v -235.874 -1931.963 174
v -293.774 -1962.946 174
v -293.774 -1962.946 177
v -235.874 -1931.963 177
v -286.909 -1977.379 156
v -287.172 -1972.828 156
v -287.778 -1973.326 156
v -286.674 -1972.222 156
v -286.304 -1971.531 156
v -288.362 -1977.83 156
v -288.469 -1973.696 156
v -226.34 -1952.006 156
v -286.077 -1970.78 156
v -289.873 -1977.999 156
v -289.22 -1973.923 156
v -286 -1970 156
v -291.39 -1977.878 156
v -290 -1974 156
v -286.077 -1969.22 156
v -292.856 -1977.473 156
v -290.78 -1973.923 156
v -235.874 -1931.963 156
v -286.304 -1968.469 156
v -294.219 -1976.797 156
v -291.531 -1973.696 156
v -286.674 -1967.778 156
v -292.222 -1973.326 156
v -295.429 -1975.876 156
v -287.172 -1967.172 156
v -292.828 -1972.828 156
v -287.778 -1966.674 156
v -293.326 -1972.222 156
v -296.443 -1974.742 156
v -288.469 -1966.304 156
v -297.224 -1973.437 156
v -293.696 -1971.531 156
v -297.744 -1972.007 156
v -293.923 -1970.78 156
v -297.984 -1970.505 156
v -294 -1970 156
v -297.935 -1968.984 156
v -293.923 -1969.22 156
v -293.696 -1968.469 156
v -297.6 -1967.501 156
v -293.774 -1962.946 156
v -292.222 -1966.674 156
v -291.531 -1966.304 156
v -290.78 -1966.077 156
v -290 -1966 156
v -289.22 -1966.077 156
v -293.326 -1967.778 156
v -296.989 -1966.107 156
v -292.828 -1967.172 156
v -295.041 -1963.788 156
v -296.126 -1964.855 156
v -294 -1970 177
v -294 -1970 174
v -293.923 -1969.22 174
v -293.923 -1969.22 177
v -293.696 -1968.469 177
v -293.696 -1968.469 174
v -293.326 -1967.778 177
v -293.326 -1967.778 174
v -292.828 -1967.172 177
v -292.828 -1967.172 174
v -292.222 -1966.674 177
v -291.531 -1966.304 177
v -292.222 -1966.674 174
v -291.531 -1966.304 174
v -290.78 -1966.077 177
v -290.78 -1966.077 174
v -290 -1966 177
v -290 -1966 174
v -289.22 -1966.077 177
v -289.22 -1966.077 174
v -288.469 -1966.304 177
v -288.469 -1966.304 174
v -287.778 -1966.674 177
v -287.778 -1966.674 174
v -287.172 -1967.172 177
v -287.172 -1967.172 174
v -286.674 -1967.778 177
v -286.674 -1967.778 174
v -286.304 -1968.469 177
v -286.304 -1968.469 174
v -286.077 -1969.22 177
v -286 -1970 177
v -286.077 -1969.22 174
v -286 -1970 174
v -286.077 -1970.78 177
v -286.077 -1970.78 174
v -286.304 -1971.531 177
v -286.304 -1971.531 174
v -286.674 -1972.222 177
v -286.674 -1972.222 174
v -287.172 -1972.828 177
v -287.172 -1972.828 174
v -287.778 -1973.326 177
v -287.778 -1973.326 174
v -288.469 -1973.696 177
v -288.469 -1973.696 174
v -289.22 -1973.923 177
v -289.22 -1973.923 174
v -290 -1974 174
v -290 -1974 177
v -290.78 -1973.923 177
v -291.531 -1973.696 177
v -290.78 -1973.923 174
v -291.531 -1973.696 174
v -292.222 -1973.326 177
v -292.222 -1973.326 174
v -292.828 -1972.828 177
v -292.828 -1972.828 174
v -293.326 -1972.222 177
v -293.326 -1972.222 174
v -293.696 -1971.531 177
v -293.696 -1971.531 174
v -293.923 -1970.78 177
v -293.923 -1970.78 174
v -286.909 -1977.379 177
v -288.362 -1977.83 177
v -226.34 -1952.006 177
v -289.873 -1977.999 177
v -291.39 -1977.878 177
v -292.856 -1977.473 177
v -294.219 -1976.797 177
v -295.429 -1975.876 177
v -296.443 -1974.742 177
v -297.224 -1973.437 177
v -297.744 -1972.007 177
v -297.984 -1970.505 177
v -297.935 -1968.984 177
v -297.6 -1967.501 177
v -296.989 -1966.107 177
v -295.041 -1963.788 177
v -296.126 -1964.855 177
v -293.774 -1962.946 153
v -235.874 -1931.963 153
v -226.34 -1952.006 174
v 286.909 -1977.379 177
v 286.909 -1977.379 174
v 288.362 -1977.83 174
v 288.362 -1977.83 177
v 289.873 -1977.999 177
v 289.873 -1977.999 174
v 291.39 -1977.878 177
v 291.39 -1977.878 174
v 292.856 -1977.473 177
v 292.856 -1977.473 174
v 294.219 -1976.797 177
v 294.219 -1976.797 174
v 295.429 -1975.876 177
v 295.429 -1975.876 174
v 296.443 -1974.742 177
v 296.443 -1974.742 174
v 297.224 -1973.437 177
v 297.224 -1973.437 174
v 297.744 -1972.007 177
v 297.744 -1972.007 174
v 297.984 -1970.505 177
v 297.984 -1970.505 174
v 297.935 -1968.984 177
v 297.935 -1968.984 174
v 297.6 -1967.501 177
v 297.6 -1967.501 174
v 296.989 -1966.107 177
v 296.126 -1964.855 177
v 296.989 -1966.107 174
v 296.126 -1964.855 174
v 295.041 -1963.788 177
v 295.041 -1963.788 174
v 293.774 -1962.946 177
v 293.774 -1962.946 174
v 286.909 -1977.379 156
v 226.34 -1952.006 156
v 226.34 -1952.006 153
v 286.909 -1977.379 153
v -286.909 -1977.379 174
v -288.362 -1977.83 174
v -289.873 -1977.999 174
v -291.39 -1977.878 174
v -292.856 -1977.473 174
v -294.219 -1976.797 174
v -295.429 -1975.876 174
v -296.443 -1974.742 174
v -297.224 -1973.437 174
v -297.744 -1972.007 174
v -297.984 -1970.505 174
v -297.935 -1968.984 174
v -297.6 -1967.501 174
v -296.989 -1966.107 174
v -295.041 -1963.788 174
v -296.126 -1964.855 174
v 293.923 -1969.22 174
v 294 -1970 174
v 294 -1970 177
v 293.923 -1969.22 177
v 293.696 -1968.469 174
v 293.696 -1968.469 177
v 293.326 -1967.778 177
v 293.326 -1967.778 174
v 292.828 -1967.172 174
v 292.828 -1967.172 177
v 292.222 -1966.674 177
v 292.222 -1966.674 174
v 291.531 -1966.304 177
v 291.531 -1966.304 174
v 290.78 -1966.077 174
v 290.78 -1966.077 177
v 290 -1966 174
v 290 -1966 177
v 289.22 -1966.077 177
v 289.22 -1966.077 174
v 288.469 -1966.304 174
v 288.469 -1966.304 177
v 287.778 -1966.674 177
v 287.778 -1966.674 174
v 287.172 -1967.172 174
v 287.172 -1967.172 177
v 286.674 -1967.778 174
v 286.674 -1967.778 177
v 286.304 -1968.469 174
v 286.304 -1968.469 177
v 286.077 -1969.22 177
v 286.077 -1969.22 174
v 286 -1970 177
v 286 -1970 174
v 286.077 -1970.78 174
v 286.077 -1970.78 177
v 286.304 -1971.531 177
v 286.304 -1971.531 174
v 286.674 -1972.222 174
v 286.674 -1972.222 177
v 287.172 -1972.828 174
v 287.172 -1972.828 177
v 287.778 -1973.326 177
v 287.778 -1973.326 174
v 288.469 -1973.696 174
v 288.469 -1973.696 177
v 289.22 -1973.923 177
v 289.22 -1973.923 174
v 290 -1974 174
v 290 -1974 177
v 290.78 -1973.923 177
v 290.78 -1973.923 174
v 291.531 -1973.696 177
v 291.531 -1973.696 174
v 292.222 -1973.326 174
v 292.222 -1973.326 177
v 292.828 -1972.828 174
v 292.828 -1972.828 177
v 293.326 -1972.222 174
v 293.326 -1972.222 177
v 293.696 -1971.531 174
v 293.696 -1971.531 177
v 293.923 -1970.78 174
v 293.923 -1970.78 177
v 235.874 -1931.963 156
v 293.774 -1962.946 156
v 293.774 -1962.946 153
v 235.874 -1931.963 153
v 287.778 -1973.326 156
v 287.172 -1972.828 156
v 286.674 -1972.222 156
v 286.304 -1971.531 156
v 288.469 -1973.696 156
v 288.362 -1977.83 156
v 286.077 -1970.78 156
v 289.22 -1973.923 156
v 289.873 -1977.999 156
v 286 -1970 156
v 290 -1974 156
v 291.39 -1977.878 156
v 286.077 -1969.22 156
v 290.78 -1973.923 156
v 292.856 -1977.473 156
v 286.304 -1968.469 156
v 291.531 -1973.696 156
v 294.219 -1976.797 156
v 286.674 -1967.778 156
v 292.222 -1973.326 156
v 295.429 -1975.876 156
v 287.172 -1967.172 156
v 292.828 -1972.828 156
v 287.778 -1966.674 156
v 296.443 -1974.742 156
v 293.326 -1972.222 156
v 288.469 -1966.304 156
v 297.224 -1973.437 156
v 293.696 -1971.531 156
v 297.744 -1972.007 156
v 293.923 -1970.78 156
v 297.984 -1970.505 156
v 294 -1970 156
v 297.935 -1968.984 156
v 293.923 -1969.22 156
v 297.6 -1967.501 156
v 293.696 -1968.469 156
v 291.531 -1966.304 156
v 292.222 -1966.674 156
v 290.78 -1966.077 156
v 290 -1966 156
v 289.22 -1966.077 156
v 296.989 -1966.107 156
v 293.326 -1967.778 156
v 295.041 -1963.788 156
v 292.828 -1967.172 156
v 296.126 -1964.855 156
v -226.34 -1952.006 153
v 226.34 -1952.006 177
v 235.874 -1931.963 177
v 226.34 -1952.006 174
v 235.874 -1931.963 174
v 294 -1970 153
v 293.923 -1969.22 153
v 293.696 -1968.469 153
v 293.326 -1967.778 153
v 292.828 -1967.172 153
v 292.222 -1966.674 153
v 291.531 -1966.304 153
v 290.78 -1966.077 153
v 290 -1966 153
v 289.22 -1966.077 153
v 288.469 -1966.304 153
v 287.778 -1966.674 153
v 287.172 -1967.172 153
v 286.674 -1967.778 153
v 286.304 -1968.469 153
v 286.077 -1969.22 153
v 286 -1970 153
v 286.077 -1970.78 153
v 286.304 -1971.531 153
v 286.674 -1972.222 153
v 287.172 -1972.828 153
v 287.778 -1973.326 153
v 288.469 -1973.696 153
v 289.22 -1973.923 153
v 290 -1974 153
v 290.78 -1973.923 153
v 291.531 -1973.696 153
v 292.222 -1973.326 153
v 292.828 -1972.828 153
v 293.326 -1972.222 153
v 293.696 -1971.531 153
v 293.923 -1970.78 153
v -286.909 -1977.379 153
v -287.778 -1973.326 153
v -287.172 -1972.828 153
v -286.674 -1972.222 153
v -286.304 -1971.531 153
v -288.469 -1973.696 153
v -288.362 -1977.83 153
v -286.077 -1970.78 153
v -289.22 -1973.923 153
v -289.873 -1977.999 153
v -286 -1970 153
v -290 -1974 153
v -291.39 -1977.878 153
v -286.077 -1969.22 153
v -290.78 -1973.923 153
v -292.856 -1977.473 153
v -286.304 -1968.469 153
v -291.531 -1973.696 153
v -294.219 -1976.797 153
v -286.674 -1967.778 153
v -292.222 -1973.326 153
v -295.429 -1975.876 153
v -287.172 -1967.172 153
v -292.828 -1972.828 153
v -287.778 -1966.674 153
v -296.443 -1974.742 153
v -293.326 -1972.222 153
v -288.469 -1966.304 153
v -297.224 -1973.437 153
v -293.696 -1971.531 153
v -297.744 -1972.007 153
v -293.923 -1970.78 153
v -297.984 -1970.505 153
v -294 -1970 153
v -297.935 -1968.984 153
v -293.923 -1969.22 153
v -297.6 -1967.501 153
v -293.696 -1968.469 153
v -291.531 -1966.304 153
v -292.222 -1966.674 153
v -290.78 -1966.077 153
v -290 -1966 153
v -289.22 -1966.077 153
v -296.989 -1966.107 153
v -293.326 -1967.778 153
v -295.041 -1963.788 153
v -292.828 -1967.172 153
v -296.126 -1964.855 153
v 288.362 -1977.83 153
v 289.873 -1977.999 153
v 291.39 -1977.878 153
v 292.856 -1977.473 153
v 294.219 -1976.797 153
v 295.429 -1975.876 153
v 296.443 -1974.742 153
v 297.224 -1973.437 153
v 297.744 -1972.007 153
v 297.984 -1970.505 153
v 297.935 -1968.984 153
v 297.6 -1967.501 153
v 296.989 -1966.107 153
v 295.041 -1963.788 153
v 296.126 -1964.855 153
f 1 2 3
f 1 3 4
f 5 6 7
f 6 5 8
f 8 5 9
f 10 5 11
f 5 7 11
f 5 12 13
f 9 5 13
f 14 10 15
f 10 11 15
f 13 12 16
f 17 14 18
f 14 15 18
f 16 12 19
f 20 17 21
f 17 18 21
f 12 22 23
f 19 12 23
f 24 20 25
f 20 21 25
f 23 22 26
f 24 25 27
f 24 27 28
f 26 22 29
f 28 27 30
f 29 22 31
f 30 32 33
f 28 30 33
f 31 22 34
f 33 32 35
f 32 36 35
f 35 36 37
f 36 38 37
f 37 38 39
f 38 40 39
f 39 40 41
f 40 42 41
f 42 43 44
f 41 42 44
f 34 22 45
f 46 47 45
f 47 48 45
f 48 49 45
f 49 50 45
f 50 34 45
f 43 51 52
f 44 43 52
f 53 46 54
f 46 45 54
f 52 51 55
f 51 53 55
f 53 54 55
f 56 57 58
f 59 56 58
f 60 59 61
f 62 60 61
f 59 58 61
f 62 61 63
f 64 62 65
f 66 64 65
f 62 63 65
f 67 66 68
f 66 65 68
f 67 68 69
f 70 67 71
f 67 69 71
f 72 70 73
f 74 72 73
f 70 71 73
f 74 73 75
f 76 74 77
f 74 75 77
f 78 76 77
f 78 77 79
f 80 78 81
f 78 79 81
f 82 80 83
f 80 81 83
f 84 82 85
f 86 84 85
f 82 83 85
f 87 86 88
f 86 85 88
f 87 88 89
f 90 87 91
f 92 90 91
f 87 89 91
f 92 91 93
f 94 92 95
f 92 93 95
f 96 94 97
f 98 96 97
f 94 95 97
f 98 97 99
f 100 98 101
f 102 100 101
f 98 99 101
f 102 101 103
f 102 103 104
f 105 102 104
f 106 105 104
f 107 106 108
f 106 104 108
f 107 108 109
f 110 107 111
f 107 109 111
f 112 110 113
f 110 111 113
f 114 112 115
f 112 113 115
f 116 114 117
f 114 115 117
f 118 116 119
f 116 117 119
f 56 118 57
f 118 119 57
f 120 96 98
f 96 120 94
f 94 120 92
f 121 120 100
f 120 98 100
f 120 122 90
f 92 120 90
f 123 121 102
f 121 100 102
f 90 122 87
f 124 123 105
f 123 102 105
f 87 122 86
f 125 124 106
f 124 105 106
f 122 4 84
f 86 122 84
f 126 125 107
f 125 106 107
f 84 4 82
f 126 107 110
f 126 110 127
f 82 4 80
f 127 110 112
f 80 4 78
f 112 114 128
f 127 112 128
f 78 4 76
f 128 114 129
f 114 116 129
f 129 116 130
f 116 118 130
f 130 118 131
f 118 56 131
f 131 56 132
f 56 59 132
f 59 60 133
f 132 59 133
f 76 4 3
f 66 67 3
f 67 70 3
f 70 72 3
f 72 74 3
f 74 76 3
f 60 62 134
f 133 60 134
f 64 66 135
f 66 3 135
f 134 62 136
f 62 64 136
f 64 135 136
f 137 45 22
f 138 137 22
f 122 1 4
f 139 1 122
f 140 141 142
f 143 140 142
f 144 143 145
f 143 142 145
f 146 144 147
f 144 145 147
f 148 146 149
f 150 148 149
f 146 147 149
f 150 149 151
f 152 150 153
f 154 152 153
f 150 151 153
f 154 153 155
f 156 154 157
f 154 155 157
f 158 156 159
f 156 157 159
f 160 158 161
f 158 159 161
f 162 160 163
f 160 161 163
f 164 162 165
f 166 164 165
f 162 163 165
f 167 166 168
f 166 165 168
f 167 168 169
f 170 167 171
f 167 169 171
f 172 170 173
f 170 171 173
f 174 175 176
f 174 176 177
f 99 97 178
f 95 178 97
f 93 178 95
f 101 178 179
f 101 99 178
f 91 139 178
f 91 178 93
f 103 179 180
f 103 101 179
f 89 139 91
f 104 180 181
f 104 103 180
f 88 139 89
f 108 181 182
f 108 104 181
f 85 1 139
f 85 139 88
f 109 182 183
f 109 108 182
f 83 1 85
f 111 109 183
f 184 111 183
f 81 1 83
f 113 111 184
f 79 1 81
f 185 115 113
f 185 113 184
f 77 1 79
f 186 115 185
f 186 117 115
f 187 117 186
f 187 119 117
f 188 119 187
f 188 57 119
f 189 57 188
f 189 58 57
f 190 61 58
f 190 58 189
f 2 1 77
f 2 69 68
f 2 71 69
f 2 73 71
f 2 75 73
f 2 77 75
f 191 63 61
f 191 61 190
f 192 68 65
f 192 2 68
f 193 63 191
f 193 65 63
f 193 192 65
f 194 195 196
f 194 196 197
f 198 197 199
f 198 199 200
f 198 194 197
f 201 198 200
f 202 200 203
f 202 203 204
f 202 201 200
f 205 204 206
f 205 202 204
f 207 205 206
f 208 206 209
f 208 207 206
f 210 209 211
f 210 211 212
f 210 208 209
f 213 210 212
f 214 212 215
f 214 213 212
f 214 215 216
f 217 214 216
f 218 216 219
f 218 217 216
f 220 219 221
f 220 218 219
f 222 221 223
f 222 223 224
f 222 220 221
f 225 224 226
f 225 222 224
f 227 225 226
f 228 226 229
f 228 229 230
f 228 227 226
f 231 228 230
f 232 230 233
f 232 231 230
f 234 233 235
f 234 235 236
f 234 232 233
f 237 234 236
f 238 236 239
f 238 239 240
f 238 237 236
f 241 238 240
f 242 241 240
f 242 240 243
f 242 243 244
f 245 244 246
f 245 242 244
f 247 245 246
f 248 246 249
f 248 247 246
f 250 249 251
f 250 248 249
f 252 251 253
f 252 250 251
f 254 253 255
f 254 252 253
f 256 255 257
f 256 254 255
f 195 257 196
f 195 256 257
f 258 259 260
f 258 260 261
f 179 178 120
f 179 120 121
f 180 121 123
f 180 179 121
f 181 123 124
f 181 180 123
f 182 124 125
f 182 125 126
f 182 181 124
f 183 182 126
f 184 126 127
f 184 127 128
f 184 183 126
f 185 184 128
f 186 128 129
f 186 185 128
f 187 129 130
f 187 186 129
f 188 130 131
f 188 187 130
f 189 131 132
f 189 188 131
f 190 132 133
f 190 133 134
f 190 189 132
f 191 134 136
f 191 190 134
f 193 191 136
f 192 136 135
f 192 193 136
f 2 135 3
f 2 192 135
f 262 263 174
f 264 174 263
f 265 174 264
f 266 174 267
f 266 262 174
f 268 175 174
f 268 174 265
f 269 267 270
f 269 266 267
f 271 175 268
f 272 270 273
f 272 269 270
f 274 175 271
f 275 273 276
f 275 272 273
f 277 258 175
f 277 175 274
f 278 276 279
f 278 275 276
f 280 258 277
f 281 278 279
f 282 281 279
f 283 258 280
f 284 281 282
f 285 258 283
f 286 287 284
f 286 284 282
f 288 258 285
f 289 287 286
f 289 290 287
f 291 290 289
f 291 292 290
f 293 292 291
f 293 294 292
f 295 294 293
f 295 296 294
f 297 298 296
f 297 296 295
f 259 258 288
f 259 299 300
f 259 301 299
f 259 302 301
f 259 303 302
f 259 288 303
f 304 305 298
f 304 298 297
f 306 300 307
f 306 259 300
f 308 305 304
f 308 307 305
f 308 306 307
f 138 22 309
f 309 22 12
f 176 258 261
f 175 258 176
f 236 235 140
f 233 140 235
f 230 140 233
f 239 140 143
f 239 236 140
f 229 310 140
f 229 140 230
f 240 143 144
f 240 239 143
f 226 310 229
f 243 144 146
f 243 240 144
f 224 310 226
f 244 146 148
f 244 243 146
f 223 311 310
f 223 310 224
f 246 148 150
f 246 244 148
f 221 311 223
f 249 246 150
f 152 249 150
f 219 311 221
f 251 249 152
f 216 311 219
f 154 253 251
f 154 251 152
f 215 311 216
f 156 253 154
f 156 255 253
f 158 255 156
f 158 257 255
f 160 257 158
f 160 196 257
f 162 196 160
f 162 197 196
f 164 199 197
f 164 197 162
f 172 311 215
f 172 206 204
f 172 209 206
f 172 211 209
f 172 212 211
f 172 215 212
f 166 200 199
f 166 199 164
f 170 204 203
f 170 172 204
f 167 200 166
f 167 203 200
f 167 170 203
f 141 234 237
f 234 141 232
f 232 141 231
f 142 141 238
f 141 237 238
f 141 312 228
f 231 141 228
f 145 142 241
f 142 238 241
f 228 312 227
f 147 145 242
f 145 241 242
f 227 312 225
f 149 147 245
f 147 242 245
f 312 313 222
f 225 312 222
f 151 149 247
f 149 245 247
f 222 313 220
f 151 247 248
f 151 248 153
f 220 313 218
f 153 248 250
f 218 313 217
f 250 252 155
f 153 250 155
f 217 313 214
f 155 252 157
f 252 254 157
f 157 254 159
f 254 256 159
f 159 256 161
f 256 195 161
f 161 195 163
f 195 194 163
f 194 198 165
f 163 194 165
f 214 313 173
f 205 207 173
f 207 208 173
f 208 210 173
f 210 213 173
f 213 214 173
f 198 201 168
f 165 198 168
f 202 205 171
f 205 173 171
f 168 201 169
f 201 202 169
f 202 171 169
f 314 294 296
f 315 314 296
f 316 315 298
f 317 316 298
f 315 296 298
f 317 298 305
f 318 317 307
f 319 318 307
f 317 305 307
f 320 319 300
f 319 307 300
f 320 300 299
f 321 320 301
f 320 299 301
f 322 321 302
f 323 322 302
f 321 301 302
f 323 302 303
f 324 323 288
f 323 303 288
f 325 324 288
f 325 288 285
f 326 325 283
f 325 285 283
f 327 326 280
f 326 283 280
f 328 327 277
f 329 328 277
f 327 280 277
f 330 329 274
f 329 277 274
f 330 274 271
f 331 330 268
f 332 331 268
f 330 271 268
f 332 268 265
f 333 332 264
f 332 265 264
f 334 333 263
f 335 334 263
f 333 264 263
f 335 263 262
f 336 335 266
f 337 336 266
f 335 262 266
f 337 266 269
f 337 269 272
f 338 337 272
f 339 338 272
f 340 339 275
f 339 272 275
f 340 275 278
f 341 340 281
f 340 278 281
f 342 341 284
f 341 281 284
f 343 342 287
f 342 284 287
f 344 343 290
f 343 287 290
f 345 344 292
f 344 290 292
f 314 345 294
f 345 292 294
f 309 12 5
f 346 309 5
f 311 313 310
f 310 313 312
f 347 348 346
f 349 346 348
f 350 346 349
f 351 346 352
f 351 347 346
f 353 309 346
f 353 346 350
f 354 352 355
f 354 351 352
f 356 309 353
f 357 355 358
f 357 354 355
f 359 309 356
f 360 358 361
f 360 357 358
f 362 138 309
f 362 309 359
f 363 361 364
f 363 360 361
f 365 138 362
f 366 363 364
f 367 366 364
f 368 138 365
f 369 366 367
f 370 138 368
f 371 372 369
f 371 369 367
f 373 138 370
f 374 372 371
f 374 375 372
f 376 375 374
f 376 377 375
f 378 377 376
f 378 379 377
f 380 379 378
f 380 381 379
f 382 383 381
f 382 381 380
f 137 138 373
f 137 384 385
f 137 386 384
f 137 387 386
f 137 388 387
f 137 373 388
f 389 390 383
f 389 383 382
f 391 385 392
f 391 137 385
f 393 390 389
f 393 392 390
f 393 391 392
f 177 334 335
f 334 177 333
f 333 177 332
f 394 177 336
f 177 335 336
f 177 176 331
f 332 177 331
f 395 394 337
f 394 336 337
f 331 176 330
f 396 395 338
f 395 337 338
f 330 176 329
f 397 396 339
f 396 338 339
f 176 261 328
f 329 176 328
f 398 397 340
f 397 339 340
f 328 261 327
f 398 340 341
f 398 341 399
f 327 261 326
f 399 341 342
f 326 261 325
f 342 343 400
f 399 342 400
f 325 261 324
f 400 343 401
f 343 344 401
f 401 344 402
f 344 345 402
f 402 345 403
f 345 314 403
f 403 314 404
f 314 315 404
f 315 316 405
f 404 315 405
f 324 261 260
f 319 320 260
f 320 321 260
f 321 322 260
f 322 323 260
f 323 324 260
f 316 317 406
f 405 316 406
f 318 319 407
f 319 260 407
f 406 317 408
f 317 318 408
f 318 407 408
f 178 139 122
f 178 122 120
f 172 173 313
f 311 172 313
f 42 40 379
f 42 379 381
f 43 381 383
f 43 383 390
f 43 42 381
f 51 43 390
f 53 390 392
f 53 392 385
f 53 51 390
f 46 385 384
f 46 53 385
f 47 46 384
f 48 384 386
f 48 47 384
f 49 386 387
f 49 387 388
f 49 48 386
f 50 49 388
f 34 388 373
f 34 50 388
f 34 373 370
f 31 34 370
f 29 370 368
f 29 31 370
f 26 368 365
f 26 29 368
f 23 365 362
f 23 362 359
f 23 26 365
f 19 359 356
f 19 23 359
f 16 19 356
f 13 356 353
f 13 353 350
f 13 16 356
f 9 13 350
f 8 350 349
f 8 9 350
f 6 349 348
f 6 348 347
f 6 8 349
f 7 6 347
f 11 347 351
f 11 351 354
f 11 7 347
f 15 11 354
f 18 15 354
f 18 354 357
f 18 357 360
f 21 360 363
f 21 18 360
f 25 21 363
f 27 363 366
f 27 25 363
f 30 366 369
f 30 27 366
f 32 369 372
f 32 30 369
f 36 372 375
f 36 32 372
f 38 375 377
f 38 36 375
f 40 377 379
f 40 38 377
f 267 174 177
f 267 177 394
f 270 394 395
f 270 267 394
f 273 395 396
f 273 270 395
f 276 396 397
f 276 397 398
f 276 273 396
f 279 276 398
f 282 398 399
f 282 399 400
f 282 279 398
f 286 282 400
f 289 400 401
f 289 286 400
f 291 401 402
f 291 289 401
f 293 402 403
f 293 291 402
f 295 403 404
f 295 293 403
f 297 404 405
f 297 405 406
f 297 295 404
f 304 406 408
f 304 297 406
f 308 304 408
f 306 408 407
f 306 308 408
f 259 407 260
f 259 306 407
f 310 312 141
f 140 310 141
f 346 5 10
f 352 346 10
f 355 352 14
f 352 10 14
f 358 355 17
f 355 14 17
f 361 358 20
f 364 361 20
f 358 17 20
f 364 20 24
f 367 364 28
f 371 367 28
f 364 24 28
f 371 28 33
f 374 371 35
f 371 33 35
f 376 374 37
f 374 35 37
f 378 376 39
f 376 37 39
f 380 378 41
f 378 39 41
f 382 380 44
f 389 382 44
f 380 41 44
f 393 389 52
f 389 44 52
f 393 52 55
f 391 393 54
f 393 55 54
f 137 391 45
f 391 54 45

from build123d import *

# Parameters (mm, degrees)
BOSS_EXTRUDE1_START     = 174
BOSS_EXTRUDE1_OUTLINE_R = 4
BOSS_EXTRUDE1_DEPTH     = 3


# Read off the part's stored shape, not the designer's step: Boss-Extrude1
with BuildPart() as part:
    # Boss-Extrude1 outline → Boss-Extrude1 (new body)
    with BuildSketch(Plane.XY.offset(BOSS_EXTRUDE1_START)):
        with BuildLine():
            Line((235.873972271, -1931.963303044), (226.339589967, -1952.006407041))
            Line((226.339589967, -1952.006407041), (286.909061616, -1977.378760052))
            ThreePointArc((286.909061616, -1977.378760052), (297.224276082, -1973.436544062), (293.774454643, -1962.946384462))
            Line((293.774454643, -1962.946384462), (235.873972271, -1931.963303044))
        make_face()
        with Locations((290, -1970)):
            Circle(BOSS_EXTRUDE1_OUTLINE_R, mode=Mode.SUBTRACT)
    extrude(amount=BOSS_EXTRUDE1_DEPTH)


with BuildPart() as body_2:
    # Mirror1: mirrored copy
    add(part.part.mirror(Plane.XY.offset(165)))


with BuildPart() as body_3:
    # Mirror2: mirrored copy
    add(part.part.mirror(Plane(origin=(0, 0, 0), x_dir=(0, 0, 1), z_dir=(1, 0, 0))))


with BuildPart() as body_4:
    # Mirror2 2: mirrored copy
    add(body_2.part.mirror(Plane(origin=(0, 0, 0), x_dir=(0, 0, 1), z_dir=(1, 0, 0))))


solid = Compound([part.part, body_2.part, body_3.part, body_4.part])
